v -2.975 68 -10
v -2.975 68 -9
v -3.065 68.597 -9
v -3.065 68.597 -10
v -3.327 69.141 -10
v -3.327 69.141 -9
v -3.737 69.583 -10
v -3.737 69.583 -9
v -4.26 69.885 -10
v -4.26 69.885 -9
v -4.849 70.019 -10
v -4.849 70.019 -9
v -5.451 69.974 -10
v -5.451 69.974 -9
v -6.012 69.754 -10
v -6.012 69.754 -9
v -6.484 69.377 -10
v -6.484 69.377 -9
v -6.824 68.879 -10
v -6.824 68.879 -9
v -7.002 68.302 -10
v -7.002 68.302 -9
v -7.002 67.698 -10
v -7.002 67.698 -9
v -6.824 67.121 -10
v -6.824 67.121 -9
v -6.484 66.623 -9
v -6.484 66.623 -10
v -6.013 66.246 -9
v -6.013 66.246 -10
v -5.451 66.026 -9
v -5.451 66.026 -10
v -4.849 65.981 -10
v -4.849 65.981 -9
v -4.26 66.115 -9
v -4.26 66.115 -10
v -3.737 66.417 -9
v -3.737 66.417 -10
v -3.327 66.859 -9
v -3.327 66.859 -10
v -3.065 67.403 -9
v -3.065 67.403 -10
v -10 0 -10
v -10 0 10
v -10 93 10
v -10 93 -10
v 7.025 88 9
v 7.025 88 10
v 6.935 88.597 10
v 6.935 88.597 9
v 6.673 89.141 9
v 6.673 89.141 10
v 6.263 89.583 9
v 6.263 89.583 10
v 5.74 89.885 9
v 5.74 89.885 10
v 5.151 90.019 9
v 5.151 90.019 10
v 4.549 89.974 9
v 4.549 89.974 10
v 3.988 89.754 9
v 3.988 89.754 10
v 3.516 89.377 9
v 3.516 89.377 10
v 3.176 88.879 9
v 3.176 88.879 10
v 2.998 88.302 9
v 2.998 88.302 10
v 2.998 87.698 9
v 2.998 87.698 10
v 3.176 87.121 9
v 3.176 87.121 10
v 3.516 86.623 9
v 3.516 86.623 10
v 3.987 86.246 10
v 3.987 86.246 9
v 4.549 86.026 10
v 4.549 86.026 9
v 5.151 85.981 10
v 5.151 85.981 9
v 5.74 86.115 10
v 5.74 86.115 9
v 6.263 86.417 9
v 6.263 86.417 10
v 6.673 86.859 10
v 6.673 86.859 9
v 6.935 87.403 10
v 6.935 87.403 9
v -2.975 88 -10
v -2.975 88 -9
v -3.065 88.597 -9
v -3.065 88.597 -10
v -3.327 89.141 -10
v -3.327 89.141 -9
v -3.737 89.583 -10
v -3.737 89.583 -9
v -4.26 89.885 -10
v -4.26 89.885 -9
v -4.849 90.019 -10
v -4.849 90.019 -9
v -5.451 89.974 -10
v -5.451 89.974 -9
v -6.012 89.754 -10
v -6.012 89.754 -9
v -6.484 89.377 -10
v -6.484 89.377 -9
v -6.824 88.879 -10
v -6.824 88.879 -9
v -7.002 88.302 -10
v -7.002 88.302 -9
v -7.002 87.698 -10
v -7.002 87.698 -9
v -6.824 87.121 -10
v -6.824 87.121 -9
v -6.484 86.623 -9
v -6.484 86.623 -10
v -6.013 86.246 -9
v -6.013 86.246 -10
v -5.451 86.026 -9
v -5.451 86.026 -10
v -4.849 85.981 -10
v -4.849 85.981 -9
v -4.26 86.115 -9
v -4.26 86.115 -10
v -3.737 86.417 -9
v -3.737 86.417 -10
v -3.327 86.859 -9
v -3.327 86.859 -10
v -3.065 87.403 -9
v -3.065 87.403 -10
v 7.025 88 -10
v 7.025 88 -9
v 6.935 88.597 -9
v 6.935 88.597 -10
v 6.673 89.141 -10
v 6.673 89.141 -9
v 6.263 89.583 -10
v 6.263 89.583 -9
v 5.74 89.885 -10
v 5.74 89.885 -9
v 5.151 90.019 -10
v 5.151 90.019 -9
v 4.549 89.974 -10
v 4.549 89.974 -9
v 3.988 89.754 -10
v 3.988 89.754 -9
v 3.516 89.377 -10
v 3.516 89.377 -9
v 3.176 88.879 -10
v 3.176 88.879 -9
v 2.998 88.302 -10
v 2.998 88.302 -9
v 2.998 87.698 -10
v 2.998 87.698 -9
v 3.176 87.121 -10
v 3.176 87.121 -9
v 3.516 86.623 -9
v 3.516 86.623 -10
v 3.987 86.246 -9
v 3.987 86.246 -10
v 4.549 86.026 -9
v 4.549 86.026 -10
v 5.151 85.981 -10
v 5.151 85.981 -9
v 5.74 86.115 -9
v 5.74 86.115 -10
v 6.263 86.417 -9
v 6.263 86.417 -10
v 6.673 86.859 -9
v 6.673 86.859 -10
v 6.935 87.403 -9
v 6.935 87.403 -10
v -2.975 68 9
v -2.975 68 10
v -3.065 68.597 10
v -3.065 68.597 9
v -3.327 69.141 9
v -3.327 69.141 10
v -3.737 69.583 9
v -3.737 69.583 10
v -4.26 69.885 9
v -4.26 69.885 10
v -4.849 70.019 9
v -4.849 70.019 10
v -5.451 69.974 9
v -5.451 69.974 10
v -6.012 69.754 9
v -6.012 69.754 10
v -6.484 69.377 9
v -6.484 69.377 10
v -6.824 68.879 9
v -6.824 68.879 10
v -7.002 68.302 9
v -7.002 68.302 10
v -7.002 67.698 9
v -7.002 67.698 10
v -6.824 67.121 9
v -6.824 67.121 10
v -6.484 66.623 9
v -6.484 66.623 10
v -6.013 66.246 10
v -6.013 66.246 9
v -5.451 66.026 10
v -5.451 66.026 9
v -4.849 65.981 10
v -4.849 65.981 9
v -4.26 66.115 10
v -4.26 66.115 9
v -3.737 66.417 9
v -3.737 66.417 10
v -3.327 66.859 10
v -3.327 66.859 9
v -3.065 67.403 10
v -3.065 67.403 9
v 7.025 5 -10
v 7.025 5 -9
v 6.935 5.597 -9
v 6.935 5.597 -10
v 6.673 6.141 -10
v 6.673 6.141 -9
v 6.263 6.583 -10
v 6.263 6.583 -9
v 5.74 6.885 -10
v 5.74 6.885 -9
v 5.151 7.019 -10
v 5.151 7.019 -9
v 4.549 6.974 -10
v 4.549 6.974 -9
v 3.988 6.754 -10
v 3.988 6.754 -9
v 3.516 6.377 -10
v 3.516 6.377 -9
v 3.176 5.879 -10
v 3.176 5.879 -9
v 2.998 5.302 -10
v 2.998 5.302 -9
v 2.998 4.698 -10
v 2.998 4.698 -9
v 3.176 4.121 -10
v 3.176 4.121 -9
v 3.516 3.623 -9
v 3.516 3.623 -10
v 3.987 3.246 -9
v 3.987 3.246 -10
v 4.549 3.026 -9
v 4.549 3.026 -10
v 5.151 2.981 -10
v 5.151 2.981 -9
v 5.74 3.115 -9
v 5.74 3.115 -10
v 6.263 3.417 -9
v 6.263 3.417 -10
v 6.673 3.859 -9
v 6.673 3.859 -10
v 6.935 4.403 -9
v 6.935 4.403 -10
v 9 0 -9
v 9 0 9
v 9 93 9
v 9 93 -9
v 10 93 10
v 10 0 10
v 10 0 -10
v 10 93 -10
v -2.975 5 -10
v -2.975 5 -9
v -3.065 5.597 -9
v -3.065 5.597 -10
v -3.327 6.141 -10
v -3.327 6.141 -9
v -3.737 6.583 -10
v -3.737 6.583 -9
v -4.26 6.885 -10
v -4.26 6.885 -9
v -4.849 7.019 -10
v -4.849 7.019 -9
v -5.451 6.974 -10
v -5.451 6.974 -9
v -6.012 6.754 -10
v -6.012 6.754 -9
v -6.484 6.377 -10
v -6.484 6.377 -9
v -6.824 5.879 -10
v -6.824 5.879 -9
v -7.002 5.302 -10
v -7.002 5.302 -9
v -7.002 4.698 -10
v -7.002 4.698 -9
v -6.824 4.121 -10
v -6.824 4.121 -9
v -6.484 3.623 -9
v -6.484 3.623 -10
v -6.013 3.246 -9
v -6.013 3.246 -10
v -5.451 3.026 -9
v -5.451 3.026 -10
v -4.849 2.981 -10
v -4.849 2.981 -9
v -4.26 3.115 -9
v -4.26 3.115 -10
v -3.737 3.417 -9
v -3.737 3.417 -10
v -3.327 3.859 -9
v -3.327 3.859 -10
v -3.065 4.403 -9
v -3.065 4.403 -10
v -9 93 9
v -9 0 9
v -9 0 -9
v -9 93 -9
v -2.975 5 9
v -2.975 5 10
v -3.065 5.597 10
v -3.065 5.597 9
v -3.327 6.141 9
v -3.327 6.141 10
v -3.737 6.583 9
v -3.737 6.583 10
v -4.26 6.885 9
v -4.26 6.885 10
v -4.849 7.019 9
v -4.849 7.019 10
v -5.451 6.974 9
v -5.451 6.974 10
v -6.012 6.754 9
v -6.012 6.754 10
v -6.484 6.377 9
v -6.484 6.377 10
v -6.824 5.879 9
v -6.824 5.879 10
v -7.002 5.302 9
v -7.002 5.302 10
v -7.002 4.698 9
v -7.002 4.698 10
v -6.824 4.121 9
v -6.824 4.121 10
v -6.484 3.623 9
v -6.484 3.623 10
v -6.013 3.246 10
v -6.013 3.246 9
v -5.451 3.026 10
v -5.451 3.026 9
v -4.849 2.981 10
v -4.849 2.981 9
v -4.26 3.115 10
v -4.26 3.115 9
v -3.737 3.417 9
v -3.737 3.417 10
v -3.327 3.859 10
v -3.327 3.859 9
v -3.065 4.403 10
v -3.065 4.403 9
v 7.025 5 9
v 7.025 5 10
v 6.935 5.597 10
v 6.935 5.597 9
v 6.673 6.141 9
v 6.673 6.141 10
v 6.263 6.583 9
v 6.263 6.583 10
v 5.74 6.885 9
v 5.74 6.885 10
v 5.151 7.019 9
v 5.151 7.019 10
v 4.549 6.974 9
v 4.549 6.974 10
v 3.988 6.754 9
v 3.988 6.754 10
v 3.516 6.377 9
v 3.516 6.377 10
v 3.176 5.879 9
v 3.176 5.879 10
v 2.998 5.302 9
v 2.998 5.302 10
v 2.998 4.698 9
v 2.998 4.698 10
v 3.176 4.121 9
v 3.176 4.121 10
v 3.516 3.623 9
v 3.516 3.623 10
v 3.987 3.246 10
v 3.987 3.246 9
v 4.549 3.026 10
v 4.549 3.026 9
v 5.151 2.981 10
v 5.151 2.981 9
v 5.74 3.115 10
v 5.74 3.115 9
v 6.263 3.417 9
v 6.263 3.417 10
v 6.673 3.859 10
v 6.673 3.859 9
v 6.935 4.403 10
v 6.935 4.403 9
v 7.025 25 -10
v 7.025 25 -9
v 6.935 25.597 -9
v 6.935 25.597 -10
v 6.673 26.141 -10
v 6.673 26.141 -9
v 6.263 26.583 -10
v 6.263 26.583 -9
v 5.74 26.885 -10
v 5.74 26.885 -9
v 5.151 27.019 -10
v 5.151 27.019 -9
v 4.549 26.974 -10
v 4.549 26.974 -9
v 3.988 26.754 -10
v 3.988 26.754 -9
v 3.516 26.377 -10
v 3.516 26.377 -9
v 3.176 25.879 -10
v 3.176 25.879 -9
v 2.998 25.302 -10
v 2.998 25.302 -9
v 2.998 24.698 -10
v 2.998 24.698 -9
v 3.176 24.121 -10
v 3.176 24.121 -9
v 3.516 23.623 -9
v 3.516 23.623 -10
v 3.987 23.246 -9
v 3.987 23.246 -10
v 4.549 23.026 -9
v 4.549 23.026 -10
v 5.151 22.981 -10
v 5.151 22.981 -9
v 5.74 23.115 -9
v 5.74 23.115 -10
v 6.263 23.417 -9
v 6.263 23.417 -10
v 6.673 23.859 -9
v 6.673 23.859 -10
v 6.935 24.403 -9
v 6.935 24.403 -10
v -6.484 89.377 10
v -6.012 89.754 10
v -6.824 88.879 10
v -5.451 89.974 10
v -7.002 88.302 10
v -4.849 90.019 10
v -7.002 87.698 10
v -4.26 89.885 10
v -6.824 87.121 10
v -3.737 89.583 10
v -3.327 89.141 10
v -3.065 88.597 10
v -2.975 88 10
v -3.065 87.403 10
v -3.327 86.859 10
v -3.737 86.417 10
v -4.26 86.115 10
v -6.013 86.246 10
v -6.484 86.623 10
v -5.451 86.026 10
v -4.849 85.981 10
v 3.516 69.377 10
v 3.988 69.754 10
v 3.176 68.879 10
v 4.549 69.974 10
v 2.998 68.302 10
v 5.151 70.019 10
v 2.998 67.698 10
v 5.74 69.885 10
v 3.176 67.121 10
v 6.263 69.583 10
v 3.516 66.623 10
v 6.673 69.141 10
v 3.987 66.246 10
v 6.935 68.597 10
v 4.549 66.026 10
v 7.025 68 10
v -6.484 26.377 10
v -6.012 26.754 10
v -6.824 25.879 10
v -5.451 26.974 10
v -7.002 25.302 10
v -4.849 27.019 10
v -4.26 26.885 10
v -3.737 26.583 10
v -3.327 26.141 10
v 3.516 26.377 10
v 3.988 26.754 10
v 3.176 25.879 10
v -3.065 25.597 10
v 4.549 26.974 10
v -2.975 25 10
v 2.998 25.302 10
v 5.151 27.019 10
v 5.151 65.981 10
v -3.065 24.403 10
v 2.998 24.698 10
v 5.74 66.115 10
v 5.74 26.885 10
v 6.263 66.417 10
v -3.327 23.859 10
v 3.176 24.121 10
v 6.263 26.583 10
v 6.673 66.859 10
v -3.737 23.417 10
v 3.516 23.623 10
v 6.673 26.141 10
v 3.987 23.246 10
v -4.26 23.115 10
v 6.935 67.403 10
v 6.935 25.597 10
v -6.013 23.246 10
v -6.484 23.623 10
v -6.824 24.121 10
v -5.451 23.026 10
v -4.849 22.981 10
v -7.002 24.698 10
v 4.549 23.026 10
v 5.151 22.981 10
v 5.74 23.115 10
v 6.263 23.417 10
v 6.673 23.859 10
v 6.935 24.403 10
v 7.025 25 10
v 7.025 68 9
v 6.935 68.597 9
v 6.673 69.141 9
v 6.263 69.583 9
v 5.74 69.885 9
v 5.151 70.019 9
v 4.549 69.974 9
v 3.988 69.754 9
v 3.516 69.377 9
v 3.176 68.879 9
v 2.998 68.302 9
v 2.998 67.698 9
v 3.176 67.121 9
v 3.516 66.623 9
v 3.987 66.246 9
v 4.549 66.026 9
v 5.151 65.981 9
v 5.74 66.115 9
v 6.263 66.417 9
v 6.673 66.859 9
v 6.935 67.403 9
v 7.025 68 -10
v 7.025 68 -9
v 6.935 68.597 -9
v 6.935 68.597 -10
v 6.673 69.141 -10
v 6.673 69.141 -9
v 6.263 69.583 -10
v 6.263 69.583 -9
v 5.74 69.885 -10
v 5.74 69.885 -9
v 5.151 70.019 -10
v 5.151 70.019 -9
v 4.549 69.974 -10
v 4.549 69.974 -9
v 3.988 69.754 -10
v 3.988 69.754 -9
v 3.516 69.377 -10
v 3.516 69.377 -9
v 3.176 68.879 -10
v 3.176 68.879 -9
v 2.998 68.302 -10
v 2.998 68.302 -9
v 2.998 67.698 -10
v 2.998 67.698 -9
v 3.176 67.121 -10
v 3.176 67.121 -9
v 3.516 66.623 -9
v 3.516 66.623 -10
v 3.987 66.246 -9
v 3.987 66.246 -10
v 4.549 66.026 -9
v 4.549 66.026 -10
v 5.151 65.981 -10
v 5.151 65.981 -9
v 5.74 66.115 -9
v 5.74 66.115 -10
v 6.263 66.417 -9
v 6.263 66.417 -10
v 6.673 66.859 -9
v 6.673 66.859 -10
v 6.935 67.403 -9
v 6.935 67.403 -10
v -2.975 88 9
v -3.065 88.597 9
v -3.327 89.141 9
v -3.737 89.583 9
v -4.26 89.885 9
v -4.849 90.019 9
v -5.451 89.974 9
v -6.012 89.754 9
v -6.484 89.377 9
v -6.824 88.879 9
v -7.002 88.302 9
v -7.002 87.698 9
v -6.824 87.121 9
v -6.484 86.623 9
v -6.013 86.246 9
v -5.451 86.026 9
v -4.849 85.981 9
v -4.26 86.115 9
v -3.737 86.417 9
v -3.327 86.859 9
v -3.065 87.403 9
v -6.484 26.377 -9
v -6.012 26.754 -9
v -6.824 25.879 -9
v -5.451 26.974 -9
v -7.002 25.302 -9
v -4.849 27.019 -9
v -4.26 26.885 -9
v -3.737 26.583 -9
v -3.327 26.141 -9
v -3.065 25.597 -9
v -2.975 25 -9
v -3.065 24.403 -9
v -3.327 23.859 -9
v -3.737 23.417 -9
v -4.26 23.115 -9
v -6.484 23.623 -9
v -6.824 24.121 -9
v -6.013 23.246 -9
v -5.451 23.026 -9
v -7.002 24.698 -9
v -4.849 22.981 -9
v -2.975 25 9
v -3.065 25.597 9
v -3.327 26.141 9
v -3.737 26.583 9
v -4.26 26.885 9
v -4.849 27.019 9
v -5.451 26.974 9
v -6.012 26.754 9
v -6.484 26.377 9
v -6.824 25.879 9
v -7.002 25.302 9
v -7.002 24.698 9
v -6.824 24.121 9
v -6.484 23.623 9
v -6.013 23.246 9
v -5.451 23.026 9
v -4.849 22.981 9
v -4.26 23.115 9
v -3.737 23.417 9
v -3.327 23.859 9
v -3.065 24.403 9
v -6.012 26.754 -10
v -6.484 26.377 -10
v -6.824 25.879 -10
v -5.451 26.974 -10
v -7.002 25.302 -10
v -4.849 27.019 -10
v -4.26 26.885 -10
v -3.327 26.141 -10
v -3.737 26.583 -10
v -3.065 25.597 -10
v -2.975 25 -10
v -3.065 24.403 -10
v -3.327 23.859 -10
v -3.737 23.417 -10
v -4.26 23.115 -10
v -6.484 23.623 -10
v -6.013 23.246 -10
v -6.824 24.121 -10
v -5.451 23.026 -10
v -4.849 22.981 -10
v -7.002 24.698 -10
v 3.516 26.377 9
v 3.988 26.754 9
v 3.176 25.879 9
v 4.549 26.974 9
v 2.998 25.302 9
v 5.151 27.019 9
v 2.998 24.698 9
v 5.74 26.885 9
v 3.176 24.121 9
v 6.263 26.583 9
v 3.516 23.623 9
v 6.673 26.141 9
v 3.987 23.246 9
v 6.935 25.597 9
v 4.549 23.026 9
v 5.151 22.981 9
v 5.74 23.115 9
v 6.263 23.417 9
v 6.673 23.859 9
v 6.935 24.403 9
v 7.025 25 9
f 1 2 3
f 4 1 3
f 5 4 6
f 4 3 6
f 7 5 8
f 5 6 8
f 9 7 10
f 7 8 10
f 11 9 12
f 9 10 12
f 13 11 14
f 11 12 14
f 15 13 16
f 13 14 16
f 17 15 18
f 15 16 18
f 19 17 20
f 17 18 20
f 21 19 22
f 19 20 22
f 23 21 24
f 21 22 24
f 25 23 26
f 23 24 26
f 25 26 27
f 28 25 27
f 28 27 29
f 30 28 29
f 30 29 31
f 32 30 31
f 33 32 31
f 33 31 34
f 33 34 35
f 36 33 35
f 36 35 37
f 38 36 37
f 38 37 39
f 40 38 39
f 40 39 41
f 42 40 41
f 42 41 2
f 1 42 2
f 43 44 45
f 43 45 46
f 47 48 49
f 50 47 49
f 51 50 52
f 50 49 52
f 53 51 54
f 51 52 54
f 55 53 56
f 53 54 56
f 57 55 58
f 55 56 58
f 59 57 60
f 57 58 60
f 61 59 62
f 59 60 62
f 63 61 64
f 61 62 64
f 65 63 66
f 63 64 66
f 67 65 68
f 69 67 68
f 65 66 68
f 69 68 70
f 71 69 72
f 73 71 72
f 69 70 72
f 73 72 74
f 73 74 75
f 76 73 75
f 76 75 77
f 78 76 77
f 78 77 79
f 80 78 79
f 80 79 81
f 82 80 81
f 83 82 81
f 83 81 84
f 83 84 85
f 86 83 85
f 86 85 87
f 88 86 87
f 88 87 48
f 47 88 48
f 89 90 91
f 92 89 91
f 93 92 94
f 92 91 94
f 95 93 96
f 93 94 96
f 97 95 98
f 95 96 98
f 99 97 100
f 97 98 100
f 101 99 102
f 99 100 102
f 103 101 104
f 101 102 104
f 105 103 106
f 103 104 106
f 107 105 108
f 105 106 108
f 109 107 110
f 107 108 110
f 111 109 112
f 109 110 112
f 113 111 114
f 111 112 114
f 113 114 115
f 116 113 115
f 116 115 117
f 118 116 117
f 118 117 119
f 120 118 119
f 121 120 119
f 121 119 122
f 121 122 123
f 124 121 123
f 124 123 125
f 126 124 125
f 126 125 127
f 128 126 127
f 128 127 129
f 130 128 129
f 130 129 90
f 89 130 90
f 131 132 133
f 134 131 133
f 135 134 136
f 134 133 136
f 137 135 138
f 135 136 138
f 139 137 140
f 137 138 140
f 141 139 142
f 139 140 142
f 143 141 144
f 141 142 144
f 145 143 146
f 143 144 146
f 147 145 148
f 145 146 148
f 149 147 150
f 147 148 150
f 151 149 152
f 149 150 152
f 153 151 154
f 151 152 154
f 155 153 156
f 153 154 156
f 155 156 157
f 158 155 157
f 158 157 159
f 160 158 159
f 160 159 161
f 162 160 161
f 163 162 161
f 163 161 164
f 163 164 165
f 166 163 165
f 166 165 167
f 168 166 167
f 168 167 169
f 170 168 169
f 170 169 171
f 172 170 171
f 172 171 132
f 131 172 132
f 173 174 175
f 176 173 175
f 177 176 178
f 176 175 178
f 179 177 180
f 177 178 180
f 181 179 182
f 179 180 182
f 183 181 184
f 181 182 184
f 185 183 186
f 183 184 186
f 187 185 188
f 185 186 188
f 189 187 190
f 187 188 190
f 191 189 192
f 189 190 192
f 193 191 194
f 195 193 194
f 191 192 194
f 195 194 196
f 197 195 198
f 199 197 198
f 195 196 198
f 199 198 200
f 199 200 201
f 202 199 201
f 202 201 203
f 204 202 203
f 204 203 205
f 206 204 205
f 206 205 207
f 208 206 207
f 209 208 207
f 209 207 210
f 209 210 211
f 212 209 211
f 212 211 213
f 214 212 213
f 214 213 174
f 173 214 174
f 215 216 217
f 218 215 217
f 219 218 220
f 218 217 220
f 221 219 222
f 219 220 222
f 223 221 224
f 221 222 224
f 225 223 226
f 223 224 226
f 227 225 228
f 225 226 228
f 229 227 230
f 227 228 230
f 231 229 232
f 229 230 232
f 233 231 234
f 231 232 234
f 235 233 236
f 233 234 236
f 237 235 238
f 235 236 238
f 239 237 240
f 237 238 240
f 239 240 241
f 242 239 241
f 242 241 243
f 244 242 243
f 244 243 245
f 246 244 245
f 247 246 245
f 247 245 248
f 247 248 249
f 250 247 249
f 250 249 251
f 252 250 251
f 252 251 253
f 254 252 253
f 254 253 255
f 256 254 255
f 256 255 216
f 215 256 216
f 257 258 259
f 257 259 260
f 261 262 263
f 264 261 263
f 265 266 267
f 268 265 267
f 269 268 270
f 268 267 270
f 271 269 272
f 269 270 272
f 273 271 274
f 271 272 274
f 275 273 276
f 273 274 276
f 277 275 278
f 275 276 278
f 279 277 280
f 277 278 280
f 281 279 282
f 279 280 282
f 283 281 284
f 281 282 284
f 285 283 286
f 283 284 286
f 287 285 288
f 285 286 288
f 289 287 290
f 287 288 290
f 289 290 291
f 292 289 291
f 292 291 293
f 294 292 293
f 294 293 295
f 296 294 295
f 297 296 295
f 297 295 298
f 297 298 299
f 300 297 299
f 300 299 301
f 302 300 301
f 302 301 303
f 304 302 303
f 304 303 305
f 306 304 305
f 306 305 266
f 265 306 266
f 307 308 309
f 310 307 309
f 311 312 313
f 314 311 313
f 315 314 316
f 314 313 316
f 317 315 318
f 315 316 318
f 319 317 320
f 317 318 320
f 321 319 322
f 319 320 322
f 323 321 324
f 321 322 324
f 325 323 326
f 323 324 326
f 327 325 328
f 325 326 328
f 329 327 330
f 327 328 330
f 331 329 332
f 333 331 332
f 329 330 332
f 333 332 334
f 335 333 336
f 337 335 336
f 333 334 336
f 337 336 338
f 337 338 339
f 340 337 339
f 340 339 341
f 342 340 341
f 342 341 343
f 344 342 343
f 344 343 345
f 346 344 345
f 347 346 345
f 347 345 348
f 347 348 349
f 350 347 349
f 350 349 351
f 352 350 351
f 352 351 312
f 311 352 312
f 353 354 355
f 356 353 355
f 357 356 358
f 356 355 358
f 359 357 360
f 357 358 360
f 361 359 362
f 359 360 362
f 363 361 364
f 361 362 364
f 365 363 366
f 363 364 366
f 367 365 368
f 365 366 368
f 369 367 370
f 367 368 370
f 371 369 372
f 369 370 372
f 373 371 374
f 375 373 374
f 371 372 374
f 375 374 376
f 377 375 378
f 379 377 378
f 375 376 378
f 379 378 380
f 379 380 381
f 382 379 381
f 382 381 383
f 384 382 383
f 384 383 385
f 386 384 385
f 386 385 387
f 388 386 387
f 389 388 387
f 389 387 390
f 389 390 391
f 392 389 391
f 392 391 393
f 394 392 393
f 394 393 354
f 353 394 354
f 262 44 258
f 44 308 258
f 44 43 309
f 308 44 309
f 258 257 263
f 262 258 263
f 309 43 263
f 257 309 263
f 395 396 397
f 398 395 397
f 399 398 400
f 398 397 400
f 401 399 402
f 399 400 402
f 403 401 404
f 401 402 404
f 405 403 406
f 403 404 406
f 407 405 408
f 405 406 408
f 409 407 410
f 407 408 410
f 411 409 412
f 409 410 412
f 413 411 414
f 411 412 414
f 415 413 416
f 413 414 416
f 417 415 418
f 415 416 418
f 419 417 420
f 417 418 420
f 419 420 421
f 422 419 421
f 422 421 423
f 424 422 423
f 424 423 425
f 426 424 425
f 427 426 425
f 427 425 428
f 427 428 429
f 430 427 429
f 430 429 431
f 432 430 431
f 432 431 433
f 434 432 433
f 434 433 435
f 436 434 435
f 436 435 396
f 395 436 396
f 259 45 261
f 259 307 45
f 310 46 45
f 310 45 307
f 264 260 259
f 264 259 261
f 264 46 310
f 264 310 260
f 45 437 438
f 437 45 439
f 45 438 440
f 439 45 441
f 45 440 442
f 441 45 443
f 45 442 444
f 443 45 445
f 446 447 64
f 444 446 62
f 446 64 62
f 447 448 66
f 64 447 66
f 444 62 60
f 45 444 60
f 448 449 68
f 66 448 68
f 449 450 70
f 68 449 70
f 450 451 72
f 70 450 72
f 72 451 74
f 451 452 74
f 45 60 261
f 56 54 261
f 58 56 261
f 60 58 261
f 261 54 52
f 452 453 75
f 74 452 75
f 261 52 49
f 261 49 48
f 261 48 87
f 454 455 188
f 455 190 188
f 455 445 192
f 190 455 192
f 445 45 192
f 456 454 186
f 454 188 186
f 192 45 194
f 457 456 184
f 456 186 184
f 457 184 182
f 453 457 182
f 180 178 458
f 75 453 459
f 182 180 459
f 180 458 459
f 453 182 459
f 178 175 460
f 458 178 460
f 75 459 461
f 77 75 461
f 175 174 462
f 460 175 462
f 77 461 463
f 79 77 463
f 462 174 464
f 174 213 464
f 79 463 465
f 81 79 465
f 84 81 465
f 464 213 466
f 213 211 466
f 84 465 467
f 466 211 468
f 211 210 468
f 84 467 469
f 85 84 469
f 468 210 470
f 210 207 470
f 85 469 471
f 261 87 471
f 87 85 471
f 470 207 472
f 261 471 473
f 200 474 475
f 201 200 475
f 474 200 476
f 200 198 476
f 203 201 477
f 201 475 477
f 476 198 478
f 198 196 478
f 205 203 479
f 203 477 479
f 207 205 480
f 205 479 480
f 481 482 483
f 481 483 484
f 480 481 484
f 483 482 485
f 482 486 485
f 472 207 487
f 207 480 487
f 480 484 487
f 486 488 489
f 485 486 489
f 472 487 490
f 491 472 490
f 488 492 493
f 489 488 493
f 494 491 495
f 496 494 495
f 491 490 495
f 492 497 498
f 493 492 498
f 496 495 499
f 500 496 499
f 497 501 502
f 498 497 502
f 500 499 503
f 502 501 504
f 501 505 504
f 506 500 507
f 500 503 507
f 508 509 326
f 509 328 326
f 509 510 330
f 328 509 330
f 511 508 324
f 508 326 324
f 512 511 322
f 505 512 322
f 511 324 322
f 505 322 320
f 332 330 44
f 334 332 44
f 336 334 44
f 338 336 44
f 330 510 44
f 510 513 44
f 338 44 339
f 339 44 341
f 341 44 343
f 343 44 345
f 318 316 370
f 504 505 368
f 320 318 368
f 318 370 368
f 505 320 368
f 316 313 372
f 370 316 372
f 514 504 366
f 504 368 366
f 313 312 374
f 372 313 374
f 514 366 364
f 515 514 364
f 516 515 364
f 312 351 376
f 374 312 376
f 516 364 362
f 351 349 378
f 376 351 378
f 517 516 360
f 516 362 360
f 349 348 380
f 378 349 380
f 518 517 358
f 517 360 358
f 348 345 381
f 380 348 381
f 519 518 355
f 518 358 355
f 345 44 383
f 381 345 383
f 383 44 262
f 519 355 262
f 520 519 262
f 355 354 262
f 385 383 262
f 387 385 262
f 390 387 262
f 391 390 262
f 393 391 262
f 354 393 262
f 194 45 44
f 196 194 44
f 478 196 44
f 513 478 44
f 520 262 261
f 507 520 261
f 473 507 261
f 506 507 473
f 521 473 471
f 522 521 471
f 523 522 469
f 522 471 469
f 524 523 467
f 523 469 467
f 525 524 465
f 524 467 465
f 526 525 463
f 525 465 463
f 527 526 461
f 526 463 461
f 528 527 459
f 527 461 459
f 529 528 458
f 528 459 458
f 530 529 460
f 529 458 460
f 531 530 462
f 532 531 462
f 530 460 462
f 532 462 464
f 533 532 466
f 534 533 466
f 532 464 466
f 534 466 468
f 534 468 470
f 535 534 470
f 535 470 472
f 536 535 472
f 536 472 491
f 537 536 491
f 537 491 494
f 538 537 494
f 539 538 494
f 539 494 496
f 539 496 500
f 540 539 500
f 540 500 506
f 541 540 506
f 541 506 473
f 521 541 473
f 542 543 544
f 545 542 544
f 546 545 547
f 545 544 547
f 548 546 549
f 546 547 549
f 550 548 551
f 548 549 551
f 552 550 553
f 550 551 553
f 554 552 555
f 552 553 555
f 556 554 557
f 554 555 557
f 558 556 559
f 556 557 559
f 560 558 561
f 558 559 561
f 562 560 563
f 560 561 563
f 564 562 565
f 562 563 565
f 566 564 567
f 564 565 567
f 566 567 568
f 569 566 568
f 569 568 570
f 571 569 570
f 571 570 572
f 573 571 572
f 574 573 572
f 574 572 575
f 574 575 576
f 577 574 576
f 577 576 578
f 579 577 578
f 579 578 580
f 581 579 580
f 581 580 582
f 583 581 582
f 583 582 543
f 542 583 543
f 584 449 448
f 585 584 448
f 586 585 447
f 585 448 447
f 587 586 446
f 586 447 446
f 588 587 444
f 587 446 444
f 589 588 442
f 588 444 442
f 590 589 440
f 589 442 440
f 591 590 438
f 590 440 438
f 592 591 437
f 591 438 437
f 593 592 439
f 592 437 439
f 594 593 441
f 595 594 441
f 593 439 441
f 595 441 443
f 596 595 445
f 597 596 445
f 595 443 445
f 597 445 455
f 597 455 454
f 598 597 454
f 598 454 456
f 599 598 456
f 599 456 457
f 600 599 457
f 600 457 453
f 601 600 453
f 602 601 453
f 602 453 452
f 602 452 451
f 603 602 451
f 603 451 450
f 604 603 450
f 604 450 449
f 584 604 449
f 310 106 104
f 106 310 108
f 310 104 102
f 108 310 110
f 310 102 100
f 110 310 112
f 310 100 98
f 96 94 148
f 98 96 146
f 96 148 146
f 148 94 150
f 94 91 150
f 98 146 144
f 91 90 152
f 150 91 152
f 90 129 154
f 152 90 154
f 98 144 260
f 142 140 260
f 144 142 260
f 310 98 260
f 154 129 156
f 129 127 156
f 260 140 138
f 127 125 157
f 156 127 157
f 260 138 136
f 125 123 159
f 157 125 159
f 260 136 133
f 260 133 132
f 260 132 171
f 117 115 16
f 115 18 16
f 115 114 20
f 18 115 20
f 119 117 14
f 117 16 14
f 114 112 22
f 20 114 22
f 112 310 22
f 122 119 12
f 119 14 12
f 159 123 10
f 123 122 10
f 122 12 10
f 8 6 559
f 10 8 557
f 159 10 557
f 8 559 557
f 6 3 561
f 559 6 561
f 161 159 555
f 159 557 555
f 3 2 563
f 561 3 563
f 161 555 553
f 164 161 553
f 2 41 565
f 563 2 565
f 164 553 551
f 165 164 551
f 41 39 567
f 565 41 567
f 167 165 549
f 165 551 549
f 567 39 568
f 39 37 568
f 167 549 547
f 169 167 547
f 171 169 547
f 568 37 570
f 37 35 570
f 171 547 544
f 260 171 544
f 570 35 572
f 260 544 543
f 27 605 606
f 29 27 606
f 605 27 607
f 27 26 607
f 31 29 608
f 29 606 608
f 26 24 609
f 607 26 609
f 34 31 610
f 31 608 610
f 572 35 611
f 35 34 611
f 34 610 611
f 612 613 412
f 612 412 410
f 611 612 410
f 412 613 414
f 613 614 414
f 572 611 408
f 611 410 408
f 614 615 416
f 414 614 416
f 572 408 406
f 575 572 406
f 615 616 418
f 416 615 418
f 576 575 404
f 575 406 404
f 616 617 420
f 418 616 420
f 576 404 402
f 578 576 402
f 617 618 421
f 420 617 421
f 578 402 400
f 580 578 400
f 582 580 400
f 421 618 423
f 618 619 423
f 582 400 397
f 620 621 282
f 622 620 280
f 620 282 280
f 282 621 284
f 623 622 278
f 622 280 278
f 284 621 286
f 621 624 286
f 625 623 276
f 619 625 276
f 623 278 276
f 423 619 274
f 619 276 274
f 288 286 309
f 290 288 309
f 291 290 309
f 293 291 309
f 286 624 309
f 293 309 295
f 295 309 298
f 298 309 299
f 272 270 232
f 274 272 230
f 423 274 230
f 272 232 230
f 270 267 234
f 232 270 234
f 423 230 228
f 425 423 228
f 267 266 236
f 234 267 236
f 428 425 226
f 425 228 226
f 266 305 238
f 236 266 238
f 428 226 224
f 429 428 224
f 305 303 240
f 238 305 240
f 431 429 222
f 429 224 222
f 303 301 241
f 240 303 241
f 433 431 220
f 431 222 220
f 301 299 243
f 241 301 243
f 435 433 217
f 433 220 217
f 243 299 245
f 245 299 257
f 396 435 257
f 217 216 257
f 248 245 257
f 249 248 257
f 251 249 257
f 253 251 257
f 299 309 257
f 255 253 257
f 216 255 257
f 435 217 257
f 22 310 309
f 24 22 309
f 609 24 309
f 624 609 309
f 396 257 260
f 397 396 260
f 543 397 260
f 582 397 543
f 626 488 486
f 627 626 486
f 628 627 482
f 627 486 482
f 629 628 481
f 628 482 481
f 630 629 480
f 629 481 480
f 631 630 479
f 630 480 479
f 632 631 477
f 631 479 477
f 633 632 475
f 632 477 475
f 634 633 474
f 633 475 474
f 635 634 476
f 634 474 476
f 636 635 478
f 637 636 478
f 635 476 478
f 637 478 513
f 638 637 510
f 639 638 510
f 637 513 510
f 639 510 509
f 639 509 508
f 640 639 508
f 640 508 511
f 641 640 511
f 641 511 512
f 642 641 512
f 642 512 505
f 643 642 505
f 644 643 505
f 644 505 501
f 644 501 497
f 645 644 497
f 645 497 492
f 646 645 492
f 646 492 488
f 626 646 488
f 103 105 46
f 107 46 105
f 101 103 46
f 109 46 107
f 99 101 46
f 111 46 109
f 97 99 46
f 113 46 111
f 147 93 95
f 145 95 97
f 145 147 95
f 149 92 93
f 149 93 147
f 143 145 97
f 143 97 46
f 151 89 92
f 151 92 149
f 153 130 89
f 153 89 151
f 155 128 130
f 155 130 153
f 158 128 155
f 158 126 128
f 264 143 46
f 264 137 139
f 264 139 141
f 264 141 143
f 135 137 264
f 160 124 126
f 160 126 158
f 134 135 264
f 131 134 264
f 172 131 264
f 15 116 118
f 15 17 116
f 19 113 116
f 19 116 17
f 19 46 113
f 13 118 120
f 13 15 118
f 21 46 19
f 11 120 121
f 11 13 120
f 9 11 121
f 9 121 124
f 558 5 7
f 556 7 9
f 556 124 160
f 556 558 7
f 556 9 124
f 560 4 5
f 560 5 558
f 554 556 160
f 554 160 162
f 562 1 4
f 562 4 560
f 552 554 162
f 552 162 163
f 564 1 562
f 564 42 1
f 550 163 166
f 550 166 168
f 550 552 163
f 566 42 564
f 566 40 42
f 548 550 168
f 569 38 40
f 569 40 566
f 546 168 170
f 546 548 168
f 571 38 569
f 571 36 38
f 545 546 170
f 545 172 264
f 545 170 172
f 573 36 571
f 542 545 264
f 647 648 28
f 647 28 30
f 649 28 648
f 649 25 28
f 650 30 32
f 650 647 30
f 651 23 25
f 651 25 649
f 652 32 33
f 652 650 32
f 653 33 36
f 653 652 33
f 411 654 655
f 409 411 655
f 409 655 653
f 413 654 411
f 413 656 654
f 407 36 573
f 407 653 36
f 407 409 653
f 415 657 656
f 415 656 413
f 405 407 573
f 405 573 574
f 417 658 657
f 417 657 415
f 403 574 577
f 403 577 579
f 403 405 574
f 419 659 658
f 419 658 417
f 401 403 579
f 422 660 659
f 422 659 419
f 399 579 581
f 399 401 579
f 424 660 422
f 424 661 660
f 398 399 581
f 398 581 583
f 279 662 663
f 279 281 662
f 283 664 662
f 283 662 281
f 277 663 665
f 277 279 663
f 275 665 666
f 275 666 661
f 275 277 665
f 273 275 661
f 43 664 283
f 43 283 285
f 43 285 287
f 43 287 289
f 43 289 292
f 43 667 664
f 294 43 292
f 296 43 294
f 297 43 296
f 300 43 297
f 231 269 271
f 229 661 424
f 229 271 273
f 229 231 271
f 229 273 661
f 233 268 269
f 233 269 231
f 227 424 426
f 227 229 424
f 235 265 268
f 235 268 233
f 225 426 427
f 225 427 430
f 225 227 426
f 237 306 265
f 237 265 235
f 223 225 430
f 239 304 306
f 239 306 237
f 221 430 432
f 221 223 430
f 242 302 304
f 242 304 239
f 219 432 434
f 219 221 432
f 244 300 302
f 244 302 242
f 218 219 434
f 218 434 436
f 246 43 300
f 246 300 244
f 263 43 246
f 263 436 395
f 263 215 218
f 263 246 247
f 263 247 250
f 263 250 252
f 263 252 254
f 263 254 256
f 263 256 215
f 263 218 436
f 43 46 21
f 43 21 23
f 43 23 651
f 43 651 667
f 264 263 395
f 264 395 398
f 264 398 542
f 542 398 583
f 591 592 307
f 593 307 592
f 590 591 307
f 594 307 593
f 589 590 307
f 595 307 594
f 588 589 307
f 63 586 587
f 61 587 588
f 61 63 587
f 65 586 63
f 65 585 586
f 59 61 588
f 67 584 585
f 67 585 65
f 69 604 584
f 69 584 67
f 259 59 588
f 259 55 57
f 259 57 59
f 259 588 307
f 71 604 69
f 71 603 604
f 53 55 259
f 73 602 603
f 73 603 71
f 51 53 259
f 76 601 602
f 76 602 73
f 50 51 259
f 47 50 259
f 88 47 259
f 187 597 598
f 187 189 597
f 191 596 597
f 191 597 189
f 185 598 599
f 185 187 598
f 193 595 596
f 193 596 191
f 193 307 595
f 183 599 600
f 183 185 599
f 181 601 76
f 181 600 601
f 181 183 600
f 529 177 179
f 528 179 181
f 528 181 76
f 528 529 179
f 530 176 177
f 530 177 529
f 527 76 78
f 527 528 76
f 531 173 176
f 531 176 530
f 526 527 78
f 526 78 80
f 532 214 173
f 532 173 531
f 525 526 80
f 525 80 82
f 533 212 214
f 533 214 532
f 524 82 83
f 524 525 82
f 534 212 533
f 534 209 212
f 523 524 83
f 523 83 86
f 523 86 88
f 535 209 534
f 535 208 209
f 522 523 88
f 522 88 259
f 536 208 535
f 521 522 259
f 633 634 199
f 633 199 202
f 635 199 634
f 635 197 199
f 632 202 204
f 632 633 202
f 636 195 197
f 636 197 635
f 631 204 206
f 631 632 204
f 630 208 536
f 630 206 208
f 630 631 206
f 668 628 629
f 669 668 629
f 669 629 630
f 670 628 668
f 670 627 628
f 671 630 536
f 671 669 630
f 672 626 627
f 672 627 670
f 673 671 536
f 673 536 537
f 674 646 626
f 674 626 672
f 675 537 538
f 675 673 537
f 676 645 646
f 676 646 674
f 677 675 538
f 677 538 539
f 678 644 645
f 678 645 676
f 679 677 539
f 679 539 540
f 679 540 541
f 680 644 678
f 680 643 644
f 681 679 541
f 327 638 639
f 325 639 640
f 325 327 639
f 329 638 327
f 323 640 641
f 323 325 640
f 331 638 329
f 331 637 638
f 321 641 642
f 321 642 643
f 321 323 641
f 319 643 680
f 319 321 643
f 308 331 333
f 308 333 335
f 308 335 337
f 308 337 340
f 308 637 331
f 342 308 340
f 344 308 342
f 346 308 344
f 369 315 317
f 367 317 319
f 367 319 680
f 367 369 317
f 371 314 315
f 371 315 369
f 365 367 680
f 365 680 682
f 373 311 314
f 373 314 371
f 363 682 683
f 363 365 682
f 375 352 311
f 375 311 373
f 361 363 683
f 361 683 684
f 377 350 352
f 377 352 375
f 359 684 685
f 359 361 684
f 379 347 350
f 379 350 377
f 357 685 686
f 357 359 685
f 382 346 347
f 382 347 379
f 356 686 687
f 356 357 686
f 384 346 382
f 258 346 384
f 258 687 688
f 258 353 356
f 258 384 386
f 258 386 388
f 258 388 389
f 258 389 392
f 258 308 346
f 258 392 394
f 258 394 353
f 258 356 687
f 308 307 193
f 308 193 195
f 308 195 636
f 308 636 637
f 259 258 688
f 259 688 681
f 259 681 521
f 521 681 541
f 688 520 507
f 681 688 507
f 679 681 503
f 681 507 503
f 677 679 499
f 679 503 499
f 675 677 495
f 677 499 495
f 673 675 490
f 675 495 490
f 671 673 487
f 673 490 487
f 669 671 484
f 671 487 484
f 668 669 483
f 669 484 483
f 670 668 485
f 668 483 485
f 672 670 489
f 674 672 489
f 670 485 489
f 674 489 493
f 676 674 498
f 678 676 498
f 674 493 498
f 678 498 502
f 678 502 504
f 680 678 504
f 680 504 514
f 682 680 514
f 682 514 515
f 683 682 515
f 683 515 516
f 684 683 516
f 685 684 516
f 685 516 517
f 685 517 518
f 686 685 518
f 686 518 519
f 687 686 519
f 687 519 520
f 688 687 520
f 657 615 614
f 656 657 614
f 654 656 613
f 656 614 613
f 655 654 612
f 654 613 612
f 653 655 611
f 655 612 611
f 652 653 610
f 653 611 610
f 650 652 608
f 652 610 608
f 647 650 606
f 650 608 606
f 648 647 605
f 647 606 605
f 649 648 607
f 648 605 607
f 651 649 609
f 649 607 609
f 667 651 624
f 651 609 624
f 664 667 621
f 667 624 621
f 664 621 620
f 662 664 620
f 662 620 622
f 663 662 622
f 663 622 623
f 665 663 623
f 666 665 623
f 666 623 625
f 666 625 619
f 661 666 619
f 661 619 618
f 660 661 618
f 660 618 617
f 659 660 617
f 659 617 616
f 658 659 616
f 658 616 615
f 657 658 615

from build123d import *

# Parameters (mm, degrees)
SKETCH_1_W          = 20
SKETCH_1_H          = 20
SKETCH_1_W_2        = 18
SKETCH_1_H_2        = 18
EXTRUDE_1_DEPTH     = 93
SKETCH_2_R          = 2.025
CUT_EXTRUDE_1_DEPTH = 21


with BuildPart() as part:
    # 草图1 → 凸台-拉伸1 (new body)
    with BuildSketch(Plane(origin=(0, 0, 0), x_dir=(1, 0, 0), z_dir=(0, 1, 0))):
        Rectangle(SKETCH_1_W, SKETCH_1_H)
        Rectangle(SKETCH_1_W_2, SKETCH_1_H_2, mode=Mode.SUBTRACT)
    extrude(amount=EXTRUDE_1_DEPTH)

    # 草图2 → 切除-拉伸1 (cut, through all)
    with BuildSketch(Plane.XY.offset(10)):
        with Locations((-5, 5)):
            Circle(SKETCH_2_R)
        with Locations((-5, 25)):
            Circle(SKETCH_2_R)
        with Locations((5, 25)):
            Circle(SKETCH_2_R)
        with Locations((5, 5)):
            Circle(SKETCH_2_R)
        with Locations((5, 88)):
            Circle(SKETCH_2_R)
        with Locations((-5, 88)):
            Circle(SKETCH_2_R)
        with Locations((-5, 68)):
            Circle(SKETCH_2_R)
        with Locations((5, 68)):
            Circle(SKETCH_2_R)
    extrude(amount=-CUT_EXTRUDE_1_DEPTH, mode=Mode.SUBTRACT)


solid = part.part
